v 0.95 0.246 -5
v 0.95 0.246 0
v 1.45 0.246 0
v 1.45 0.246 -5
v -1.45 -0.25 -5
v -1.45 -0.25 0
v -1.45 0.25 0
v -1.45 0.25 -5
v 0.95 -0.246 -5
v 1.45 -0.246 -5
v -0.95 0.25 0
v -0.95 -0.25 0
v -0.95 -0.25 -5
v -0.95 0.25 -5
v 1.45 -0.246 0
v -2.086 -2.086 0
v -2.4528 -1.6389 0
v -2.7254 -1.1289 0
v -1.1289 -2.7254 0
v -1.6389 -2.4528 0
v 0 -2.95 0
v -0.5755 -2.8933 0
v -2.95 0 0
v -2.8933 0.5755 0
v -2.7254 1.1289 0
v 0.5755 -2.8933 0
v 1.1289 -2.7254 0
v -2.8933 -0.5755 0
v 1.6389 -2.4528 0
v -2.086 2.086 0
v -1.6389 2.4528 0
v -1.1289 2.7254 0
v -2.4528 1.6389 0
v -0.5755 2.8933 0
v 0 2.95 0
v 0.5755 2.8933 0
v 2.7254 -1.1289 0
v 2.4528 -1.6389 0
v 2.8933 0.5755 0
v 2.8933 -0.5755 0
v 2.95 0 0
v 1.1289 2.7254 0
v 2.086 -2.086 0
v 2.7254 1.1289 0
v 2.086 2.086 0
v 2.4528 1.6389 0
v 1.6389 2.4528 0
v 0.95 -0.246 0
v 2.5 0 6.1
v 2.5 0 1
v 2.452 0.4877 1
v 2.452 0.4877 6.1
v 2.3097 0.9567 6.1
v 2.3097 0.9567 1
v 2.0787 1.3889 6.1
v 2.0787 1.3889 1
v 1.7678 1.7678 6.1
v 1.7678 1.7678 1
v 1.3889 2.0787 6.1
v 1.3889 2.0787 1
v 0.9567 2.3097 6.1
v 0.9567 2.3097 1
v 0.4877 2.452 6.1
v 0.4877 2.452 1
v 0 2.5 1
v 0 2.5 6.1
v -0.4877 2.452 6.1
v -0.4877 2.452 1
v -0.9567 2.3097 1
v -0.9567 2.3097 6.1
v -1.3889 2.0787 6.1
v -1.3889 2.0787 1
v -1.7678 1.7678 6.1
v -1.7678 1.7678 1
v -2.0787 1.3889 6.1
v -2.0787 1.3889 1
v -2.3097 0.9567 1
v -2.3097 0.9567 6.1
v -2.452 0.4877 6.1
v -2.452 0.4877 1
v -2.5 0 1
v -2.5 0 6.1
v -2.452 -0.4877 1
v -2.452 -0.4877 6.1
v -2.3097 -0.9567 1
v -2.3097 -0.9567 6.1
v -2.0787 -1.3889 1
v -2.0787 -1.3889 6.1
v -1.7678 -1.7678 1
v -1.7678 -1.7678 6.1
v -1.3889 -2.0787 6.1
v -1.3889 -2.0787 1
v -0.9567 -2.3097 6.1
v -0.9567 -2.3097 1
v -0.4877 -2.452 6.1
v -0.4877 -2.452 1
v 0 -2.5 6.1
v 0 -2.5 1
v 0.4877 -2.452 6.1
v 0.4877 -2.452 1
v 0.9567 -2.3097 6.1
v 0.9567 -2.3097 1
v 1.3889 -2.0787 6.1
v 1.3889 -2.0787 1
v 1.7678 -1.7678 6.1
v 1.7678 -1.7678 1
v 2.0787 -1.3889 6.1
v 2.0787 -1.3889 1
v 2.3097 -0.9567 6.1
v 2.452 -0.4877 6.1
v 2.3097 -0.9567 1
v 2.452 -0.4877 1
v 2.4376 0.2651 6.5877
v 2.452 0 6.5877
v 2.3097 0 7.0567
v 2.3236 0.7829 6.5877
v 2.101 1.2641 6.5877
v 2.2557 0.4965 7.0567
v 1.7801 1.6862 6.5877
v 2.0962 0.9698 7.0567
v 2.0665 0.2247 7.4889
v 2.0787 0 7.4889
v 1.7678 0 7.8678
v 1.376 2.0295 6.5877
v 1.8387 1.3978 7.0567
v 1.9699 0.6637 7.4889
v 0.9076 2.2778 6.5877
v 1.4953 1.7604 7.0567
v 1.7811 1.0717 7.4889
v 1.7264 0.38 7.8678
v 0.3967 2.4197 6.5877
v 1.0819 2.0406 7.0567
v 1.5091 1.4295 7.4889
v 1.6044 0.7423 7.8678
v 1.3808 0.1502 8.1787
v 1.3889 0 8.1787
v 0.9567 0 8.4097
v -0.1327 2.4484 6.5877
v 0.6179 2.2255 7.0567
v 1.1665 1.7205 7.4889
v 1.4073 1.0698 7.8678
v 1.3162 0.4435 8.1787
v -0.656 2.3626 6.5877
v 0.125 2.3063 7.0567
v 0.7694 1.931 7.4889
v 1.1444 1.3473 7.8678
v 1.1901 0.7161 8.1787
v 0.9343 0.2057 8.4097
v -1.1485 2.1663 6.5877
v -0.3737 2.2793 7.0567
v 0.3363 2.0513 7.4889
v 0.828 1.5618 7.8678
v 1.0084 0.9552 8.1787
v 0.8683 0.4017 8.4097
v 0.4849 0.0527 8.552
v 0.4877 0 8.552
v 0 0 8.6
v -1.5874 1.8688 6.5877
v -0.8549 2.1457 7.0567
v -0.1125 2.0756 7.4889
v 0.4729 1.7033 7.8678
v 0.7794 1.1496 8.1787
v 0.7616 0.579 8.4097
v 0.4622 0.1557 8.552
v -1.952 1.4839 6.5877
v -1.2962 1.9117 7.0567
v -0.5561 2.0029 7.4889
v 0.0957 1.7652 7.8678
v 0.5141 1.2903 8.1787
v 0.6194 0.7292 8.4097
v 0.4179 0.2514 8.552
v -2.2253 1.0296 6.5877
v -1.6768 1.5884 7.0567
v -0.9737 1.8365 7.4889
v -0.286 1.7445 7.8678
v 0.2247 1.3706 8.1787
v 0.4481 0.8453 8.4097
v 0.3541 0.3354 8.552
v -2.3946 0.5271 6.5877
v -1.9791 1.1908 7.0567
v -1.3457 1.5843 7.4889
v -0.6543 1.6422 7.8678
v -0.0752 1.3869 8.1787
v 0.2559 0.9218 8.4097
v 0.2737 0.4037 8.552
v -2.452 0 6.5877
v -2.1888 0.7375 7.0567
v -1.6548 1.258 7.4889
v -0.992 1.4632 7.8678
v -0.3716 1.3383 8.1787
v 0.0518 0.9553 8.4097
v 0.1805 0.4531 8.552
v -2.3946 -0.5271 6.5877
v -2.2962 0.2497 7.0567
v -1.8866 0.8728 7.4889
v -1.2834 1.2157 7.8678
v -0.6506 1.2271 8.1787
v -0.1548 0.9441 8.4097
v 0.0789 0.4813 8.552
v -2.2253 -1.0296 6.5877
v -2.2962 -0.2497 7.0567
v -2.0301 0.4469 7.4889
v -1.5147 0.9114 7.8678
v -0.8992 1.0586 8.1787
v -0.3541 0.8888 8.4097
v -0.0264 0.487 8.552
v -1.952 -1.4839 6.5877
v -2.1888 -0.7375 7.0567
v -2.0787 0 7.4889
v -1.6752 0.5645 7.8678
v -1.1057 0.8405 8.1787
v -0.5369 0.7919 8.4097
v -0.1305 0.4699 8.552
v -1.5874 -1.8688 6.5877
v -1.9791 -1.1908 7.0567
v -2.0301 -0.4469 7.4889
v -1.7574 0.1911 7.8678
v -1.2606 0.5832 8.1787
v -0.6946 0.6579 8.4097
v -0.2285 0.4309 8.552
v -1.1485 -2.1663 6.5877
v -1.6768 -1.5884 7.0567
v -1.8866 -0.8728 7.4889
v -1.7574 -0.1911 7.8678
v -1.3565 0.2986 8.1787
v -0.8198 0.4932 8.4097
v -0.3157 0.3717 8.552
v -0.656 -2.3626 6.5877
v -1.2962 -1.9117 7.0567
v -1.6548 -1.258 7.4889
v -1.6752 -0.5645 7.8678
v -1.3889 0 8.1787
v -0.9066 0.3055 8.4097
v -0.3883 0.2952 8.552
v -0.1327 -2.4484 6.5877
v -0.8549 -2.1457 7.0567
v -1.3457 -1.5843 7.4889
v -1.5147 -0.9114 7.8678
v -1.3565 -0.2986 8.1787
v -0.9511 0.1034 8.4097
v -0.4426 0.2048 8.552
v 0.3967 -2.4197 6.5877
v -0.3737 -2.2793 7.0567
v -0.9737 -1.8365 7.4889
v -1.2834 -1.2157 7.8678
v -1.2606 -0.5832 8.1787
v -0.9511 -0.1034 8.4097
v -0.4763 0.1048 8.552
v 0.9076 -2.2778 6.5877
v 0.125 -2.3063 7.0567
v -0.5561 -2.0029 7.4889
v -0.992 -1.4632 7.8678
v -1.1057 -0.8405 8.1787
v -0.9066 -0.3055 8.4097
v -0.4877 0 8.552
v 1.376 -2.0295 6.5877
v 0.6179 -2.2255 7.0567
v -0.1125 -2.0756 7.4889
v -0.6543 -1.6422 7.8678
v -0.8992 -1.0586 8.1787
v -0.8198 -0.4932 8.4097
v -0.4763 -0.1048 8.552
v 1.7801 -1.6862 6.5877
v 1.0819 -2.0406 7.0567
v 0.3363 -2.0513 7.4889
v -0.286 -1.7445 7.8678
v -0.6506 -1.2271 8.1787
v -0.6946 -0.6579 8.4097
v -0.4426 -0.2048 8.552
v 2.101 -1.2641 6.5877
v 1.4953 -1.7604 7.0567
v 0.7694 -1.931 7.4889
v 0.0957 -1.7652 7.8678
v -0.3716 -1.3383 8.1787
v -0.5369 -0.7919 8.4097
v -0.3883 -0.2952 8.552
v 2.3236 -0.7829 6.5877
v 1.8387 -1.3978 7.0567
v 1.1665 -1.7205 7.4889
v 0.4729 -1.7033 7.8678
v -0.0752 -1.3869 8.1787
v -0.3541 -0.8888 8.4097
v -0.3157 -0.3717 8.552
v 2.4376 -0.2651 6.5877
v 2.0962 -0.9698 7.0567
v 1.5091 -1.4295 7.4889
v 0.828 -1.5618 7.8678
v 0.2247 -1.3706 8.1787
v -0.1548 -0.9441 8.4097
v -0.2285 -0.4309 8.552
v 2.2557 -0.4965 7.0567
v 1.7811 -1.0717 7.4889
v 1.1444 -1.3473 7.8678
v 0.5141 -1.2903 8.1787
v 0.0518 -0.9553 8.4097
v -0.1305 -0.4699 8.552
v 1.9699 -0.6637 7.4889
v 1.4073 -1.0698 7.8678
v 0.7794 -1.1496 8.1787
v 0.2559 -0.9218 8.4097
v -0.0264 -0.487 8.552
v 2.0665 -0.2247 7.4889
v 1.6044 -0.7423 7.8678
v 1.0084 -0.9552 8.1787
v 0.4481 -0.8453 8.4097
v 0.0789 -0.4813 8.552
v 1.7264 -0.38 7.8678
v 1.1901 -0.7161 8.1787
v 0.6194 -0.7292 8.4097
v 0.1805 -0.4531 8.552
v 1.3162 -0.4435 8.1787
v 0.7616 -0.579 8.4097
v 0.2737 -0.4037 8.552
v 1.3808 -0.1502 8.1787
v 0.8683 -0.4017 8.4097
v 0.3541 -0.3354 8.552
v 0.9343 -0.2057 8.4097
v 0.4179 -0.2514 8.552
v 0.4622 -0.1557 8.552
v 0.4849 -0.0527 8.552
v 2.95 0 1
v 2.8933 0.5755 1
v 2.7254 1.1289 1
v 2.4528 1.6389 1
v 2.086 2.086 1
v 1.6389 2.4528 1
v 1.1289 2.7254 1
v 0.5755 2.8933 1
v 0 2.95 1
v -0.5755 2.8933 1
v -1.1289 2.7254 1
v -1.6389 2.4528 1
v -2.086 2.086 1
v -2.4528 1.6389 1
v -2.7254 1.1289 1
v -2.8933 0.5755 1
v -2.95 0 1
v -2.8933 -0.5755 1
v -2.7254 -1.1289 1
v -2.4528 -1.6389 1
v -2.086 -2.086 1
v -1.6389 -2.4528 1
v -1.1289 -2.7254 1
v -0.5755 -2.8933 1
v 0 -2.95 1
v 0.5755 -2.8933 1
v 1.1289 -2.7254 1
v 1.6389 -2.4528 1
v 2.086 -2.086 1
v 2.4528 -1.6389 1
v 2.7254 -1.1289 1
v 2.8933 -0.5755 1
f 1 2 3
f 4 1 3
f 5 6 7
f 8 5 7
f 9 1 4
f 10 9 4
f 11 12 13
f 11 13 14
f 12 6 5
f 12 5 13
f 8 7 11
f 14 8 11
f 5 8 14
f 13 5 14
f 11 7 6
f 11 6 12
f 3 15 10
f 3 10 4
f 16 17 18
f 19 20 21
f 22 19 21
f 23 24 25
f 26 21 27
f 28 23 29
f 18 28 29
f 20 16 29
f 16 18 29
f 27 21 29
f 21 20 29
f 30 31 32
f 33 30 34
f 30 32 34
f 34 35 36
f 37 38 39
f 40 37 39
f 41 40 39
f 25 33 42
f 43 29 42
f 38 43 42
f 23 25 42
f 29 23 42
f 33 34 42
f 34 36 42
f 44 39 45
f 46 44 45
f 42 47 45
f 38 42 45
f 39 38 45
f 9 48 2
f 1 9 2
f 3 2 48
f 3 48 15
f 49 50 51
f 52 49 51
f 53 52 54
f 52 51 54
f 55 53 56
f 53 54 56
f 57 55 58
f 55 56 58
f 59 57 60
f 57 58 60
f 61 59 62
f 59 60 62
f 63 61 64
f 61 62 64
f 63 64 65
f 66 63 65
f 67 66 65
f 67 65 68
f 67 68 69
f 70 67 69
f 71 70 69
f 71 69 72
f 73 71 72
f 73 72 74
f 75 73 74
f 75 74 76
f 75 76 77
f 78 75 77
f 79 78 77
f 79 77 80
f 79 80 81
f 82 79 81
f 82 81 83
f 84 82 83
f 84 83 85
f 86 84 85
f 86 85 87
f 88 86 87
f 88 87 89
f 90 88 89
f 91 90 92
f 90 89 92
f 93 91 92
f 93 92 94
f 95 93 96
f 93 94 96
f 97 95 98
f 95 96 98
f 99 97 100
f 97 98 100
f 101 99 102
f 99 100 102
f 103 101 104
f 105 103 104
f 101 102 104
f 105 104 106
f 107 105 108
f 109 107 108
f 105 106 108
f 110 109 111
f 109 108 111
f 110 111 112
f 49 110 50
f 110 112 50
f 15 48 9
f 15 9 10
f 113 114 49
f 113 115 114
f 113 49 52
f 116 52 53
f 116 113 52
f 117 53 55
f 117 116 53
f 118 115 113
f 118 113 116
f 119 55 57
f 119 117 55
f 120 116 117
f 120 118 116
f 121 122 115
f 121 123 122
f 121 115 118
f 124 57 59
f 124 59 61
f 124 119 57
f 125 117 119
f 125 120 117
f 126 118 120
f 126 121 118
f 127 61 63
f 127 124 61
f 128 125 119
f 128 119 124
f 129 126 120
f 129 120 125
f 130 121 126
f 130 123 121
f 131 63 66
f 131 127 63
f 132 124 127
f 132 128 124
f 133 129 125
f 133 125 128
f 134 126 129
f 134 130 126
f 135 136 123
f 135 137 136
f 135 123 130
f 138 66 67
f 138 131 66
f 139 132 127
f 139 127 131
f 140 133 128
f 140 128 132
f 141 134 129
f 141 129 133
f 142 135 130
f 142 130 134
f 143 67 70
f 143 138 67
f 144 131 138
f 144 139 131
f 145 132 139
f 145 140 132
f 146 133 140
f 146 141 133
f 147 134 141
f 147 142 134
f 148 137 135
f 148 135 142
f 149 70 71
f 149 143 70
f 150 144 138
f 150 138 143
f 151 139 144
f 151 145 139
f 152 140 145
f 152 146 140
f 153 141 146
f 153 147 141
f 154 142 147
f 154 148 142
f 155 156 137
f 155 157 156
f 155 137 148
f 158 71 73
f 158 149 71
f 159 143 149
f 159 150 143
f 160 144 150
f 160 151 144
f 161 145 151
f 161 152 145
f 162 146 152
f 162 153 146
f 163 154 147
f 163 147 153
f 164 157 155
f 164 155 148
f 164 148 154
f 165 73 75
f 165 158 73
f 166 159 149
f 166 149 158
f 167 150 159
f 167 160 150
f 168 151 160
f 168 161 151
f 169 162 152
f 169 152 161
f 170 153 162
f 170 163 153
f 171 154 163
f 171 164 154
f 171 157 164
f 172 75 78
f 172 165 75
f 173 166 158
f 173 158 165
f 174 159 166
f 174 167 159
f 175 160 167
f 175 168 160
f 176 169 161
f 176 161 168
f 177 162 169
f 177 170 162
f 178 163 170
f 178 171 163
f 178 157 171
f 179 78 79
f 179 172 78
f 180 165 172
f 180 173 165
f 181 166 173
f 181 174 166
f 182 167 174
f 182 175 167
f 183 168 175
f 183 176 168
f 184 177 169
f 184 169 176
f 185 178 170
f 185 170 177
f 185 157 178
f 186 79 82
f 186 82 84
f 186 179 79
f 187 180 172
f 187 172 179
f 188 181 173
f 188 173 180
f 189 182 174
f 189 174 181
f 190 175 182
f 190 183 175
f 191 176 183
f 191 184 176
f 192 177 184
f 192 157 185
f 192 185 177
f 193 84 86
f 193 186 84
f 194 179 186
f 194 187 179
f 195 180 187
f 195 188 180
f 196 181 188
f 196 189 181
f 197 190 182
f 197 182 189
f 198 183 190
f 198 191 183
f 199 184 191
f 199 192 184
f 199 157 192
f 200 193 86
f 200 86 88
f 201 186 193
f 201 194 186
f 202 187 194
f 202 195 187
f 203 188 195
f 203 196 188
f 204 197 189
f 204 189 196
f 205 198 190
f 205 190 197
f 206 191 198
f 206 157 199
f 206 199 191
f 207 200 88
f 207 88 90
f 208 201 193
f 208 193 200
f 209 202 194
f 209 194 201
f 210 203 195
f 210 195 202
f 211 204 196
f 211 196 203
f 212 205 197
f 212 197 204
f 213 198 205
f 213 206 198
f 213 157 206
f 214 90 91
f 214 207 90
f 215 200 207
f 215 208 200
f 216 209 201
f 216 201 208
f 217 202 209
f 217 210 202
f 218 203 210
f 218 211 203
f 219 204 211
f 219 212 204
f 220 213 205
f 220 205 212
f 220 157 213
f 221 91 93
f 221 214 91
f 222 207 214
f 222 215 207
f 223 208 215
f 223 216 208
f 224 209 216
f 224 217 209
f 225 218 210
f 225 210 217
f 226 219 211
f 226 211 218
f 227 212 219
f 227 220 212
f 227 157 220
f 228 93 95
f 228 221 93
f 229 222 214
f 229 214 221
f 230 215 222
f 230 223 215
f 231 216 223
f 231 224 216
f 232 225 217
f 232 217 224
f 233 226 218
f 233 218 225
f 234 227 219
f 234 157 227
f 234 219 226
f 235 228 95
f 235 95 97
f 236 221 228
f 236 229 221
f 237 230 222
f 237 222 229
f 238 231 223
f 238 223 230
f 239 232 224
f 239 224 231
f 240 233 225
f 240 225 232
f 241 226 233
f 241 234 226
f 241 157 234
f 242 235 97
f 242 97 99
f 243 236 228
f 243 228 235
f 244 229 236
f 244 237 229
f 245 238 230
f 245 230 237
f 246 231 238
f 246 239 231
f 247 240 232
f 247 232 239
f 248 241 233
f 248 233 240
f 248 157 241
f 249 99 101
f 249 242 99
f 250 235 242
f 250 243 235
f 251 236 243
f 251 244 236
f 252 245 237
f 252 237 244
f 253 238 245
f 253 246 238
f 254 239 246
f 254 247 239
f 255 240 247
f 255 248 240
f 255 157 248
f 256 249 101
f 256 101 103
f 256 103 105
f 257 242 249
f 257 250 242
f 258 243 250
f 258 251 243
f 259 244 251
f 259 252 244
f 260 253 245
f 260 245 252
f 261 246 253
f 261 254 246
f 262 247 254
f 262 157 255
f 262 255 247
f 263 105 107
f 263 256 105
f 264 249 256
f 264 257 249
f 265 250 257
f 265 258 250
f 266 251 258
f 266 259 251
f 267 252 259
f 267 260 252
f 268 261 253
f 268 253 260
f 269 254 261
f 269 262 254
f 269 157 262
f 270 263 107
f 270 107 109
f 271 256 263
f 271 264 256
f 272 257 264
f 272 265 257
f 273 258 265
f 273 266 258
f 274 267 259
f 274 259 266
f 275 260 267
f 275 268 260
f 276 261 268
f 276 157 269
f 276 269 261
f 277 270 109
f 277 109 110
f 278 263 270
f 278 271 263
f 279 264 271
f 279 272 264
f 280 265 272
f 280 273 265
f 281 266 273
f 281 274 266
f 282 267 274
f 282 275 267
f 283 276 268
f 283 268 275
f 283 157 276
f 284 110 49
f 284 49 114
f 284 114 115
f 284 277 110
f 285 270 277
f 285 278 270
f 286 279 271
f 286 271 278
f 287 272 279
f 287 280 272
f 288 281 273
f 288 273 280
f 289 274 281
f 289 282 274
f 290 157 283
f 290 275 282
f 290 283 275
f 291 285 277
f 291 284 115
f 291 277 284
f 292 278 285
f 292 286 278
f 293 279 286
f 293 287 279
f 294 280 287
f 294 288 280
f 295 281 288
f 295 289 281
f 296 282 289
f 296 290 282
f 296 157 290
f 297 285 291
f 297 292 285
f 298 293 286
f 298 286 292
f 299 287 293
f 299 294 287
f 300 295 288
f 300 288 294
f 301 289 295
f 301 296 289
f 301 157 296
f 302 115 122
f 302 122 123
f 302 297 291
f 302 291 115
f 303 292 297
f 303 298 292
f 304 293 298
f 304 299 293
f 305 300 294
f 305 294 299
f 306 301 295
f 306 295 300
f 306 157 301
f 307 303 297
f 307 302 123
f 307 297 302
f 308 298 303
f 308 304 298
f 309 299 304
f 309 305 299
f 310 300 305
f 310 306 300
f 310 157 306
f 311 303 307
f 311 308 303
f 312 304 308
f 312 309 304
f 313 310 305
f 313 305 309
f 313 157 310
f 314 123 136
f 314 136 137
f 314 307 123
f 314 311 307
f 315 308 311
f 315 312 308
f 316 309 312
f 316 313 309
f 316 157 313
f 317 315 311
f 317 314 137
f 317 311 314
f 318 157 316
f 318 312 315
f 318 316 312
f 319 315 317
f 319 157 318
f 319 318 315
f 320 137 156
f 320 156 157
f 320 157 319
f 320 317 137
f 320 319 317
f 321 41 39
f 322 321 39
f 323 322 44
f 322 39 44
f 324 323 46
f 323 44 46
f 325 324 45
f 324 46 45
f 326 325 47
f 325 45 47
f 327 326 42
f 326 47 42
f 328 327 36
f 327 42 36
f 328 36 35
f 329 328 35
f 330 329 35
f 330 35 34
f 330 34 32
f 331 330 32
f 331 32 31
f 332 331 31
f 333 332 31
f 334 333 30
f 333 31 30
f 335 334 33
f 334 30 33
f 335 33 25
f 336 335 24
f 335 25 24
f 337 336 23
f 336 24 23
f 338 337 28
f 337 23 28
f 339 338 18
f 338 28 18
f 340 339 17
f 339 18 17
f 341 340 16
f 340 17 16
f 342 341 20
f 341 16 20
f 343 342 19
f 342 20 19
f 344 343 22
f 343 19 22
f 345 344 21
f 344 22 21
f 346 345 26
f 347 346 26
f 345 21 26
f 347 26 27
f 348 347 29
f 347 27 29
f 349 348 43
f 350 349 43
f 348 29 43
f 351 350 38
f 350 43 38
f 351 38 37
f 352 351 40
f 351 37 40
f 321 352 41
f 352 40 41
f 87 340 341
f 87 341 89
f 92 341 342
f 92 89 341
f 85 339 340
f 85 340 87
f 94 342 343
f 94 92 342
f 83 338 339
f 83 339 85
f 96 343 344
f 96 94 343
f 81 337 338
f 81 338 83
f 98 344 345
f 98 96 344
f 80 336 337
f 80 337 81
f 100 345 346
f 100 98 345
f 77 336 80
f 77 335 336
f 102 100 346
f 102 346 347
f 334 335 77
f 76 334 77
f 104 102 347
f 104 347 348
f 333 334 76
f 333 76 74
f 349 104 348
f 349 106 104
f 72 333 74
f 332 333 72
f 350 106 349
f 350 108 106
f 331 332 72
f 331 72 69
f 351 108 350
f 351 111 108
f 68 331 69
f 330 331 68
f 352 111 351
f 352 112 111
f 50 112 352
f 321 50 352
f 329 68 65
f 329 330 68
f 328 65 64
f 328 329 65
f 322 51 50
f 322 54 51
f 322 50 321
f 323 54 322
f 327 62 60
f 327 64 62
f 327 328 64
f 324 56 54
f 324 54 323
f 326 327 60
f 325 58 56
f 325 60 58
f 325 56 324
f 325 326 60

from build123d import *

# Parameters (mm, degrees)
F0_R     = 2.5
F1_DEPTH = 8.6
F0_R_2   = 2.95
F2_DEPTH = 1
F3_R     = 2.5
F4_W     = 0.5
F4_H     = 0.491922
F4_H_2   = 0.5
F5_DEPTH = 5


with BuildPart() as f1:
    # F0 (on Top) → F1 (new body)
    with BuildSketch(Plane.XY):
        Circle(F0_R)
    extrude(amount=F1_DEPTH)

    # F0 (on Top) → F2 (join)
    with BuildSketch(Plane.XY):
        Circle(F0_R_2)
        Circle(F0_R, mode=Mode.SUBTRACT)
    extrude(amount=F2_DEPTH)

    # F3
    f3_edges = [f1.edges().sort_by_distance(p)[0] for p in [
        (-2.5, 0, 8.6),
    ]]
    fillet(f3_edges, radius=F3_R)


with BuildPart() as f5:
    # F4 (on face) → F5 (new body)
    with BuildSketch(Plane.XY):
        with Locations((1.2, 0)):
            Rectangle(F4_W, F4_H)
        with Locations((-1.2, 0)):
            Rectangle(F4_W, F4_H_2)
    extrude(amount=-F5_DEPTH)


solid = Compound([f1.part, f5.part])
